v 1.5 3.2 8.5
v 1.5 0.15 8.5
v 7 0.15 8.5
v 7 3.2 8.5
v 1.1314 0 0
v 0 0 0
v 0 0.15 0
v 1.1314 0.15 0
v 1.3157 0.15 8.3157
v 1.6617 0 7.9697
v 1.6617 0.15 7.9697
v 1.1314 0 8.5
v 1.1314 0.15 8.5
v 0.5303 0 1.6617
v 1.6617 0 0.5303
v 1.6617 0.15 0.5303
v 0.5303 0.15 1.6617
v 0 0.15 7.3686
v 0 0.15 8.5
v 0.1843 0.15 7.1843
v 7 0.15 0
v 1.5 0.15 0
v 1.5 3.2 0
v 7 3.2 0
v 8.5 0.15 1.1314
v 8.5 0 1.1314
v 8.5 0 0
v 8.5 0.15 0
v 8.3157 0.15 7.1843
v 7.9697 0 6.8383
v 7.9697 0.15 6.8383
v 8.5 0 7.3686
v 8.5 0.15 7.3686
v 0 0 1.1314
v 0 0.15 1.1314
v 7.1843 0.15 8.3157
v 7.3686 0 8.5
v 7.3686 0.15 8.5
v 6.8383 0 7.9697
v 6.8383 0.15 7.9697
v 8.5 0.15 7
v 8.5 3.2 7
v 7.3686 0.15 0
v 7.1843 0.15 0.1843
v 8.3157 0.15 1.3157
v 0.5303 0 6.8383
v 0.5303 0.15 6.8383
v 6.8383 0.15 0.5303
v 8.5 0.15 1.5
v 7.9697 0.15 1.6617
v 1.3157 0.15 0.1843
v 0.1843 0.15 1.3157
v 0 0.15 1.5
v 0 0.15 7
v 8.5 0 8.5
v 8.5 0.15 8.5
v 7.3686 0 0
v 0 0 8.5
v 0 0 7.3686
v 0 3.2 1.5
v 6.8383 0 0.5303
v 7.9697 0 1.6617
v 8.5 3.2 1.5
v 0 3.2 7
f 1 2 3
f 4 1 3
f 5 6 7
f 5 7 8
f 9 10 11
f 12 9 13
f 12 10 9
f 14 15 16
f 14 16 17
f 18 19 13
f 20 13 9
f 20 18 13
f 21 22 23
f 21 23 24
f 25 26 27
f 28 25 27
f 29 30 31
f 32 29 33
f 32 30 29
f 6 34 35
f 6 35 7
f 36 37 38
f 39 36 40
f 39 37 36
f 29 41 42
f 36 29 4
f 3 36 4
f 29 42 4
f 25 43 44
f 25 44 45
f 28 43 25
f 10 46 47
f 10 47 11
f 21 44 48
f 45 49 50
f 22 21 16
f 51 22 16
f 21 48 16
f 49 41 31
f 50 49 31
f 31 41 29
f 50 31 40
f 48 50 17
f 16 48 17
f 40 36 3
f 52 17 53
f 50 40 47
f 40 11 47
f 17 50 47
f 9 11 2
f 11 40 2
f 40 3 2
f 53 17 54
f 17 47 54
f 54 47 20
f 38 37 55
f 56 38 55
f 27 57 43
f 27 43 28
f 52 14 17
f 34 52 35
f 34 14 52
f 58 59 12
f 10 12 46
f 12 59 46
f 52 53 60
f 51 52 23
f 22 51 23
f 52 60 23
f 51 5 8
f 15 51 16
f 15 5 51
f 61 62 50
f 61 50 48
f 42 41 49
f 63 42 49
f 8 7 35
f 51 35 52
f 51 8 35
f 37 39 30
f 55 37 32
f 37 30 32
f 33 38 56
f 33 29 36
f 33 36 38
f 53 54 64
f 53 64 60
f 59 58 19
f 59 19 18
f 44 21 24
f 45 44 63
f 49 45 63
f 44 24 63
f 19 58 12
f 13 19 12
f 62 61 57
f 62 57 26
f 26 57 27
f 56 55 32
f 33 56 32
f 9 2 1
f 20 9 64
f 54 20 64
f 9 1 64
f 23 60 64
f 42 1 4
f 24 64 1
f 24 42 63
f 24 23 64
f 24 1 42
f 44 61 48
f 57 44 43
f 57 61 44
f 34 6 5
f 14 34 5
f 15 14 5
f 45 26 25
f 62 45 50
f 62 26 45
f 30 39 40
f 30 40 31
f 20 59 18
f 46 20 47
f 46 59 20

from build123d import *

# Parameters (mm, degrees)
SKETCH1_W           = 8.5
SKETCH1_H           = 8.5
BOSS_EXTRUDE1_DEPTH = 3.2
CUT_EXTRUDE1_DEPTH  = 3.05
CUT_EXTRUDE2_DEPTH  = 0.15


with BuildPart() as part:
    # Sketch1 → Boss-Extrude1 (new body)
    with BuildSketch(Plane(origin=(0, 0, 0), x_dir=(1, 0, 0), z_dir=(0, 1, 0))):
        with Locations((4.25, -4.25)):
            Rectangle(SKETCH1_W, SKETCH1_H)
    extrude(amount=BOSS_EXTRUDE1_DEPTH)

    # Sketch2 → Cut-Extrude1 (cut)
    with BuildSketch(Plane(origin=(0, 3.2, 0), x_dir=(1, 0, 0), z_dir=(0, 1, 0))):
        Polygon((1.5, -8.5), (0, -7), (0, -8.5), align=None)
        Polygon((0, -1.5), (1.5, 0), (0, 0), align=None)
        Polygon((8.5, 0), (7, 0), (8.5, -1.5), align=None)
        Polygon((8.5, -8.5), (8.5, -7), (7, -8.5), align=None)
    extrude(amount=-CUT_EXTRUDE1_DEPTH, mode=Mode.SUBTRACT)

    # Sketch3 → Cut-Extrude2 (cut)
    with BuildSketch(Plane.XZ):
        Polygon((8.5, 1.13137085), (7.969669914, 1.661700936), (6.838299064, 0.530330086), (7.36862915, 0), (1.13137085, 0), (1.661700936, 0.530330086), (0.530330086, 1.661700936), (0, 1.13137085), (0, 7.36862915), (0.530330086, 6.838299064), (1.661700936, 7.969669914), (1.13137085, 8.5), (7.36862915, 8.5), (6.838299064, 7.969669914), (7.969669914, 6.838299064), (8.5, 7.36862915), align=None)
    extrude(amount=-CUT_EXTRUDE2_DEPTH, mode=Mode.SUBTRACT)


solid = part.part
